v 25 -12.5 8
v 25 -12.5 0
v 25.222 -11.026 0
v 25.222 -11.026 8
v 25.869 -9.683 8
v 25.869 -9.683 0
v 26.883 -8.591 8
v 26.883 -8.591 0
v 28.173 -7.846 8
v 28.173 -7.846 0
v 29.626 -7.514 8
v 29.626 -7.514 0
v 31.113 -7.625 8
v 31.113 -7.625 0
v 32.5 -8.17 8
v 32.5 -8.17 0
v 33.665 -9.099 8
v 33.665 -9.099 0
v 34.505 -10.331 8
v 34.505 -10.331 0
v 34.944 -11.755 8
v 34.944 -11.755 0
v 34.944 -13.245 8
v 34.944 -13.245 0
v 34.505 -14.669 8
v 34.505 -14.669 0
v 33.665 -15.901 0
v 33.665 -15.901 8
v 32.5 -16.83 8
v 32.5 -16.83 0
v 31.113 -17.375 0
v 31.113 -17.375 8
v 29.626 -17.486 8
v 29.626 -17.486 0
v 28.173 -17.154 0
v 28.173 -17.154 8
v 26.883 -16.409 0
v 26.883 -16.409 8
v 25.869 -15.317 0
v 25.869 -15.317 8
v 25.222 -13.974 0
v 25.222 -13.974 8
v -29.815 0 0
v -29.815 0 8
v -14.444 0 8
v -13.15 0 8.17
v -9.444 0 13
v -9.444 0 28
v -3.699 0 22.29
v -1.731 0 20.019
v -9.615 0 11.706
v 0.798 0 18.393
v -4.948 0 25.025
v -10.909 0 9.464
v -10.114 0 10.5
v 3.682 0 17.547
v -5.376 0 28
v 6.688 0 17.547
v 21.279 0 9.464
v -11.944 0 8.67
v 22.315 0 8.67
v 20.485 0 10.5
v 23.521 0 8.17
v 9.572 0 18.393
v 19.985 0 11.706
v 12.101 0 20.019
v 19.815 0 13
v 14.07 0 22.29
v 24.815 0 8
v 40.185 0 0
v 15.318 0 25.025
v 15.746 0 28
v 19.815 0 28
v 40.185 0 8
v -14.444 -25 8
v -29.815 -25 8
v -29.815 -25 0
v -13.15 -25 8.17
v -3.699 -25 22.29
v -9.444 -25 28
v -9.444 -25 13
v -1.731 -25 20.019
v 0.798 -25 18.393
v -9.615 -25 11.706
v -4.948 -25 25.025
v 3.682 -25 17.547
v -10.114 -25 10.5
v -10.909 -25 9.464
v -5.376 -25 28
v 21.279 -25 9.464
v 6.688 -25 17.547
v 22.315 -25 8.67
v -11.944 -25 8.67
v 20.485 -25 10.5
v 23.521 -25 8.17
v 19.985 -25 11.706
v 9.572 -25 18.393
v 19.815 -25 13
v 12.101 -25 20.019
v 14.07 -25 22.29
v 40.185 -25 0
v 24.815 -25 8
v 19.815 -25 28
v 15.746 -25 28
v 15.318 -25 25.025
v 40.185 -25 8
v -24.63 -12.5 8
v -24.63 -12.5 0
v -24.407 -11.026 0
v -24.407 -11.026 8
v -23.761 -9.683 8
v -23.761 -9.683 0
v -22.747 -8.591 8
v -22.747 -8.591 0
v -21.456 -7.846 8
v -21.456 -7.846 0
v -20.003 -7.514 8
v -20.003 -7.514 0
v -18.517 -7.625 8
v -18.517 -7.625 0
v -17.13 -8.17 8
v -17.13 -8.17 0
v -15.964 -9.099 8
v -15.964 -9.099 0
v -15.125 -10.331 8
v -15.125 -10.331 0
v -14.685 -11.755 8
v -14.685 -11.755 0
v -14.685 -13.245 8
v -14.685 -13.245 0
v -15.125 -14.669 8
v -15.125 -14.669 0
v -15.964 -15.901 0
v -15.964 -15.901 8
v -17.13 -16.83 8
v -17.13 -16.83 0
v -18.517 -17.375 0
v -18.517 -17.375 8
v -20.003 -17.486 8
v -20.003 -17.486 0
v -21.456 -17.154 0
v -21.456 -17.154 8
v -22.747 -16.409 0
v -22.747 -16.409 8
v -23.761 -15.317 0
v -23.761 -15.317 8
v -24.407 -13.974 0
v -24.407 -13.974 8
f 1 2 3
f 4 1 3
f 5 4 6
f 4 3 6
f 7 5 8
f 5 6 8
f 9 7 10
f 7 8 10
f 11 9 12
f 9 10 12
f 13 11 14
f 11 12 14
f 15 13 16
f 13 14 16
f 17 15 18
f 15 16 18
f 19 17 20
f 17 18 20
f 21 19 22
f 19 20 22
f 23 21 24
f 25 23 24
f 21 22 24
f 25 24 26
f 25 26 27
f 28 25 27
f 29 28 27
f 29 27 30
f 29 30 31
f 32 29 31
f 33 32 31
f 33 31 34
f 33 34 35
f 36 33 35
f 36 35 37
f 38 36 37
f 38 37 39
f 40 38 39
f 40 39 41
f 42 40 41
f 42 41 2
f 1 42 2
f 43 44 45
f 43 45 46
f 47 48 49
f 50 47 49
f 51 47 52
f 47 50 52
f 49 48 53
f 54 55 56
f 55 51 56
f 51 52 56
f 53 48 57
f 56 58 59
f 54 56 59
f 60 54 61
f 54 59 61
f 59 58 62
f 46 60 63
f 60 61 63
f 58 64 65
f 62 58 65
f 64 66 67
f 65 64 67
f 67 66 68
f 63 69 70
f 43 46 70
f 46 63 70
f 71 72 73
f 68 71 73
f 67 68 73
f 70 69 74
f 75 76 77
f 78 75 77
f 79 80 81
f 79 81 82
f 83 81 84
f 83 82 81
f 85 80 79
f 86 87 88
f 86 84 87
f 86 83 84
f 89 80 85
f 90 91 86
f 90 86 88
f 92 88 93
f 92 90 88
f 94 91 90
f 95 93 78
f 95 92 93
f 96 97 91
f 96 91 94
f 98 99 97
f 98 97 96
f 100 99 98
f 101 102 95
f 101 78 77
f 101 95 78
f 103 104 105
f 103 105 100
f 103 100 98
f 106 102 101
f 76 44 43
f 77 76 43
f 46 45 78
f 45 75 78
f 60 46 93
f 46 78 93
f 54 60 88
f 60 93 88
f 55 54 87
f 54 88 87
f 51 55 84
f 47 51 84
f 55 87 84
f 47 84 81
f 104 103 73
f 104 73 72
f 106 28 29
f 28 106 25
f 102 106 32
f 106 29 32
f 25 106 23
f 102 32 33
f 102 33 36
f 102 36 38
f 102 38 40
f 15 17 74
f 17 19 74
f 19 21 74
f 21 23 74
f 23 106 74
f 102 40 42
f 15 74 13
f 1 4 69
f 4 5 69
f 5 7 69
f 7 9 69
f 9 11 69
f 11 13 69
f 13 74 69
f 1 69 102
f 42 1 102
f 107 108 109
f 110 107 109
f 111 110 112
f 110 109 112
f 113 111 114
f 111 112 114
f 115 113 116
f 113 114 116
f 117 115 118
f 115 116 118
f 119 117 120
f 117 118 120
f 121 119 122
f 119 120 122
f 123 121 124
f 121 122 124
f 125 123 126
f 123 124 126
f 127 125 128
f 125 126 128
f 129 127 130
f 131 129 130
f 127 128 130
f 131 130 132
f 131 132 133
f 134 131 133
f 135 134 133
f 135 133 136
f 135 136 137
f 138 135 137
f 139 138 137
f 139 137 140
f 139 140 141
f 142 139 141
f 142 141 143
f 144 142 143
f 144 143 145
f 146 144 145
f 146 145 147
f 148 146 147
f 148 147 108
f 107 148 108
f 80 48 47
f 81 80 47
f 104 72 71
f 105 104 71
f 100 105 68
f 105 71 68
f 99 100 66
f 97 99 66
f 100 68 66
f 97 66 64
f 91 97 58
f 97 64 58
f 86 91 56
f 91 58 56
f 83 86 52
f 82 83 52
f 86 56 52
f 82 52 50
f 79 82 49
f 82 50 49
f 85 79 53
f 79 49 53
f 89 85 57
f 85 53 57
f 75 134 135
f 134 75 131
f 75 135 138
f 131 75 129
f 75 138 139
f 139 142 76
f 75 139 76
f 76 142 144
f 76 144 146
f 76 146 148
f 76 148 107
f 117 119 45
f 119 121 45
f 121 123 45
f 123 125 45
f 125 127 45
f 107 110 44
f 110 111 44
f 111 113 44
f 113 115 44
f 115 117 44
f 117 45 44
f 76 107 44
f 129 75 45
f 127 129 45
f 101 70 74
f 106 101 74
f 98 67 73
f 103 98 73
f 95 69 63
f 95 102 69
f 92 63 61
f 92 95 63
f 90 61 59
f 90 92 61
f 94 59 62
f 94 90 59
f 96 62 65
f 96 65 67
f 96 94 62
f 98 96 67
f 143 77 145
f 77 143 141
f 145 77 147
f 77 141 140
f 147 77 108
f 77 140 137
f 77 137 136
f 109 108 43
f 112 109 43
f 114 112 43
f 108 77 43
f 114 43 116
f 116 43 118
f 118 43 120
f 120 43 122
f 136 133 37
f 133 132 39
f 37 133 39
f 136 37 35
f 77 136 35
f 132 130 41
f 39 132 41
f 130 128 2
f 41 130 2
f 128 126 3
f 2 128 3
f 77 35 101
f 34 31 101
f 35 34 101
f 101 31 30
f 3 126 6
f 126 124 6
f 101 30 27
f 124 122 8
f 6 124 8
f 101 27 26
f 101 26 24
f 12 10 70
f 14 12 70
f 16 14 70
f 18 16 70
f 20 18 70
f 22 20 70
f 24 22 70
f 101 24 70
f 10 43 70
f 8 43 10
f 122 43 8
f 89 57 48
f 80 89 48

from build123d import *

# Parameters (mm, degrees)
F1_DEPTH = 25
F3_D     = 10
F4_D     = 10
F5_R     = 5


with BuildPart() as f1:
    # F0 (on Front) → F1 (new body)
    with BuildSketch(Plane.XZ):
        with BuildLine():
            Line((-29.814812, 8), (-29.814812, 0))
            Line((-29.814812, 0), (40.185188, 0))
            Line((40.185188, 0), (40.185188, 8))
            Line((40.185188, 8), (19.814818, 8))
            Line((19.814818, 8), (19.814818, 28))
            Line((19.814818, 28), (15.746092, 28))
            ThreePointArc((15.746092, 28), (5.185188, 17.439096), (-5.375716, 28))
            Line((-5.375716, 28), (-9.444442, 28))
            Line((-9.444442, 28), (-9.444442, 8))
            Line((-9.444442, 8), (-29.814812, 8))
        make_face()
    extrude(amount=F1_DEPTH)

    # F3 (through all)
    with Locations(Plane.XY.offset(8)):
        with Locations((-19.629627, -12.5)):
            Hole(F3_D / 2)

    # F4 (through all)
    with Locations(Plane.XY.offset(8)):
        with Locations((30.000003, -12.5)):
            Hole(F4_D / 2)

    # F5
    f5_edges = [f1.edges().sort_by_distance(p)[0] for p in [
        (-9.444442, -12.5, 8),
        (19.814818, -12.5, 8),
    ]]
    fillet(f5_edges, radius=F5_R)


solid = f1.part
